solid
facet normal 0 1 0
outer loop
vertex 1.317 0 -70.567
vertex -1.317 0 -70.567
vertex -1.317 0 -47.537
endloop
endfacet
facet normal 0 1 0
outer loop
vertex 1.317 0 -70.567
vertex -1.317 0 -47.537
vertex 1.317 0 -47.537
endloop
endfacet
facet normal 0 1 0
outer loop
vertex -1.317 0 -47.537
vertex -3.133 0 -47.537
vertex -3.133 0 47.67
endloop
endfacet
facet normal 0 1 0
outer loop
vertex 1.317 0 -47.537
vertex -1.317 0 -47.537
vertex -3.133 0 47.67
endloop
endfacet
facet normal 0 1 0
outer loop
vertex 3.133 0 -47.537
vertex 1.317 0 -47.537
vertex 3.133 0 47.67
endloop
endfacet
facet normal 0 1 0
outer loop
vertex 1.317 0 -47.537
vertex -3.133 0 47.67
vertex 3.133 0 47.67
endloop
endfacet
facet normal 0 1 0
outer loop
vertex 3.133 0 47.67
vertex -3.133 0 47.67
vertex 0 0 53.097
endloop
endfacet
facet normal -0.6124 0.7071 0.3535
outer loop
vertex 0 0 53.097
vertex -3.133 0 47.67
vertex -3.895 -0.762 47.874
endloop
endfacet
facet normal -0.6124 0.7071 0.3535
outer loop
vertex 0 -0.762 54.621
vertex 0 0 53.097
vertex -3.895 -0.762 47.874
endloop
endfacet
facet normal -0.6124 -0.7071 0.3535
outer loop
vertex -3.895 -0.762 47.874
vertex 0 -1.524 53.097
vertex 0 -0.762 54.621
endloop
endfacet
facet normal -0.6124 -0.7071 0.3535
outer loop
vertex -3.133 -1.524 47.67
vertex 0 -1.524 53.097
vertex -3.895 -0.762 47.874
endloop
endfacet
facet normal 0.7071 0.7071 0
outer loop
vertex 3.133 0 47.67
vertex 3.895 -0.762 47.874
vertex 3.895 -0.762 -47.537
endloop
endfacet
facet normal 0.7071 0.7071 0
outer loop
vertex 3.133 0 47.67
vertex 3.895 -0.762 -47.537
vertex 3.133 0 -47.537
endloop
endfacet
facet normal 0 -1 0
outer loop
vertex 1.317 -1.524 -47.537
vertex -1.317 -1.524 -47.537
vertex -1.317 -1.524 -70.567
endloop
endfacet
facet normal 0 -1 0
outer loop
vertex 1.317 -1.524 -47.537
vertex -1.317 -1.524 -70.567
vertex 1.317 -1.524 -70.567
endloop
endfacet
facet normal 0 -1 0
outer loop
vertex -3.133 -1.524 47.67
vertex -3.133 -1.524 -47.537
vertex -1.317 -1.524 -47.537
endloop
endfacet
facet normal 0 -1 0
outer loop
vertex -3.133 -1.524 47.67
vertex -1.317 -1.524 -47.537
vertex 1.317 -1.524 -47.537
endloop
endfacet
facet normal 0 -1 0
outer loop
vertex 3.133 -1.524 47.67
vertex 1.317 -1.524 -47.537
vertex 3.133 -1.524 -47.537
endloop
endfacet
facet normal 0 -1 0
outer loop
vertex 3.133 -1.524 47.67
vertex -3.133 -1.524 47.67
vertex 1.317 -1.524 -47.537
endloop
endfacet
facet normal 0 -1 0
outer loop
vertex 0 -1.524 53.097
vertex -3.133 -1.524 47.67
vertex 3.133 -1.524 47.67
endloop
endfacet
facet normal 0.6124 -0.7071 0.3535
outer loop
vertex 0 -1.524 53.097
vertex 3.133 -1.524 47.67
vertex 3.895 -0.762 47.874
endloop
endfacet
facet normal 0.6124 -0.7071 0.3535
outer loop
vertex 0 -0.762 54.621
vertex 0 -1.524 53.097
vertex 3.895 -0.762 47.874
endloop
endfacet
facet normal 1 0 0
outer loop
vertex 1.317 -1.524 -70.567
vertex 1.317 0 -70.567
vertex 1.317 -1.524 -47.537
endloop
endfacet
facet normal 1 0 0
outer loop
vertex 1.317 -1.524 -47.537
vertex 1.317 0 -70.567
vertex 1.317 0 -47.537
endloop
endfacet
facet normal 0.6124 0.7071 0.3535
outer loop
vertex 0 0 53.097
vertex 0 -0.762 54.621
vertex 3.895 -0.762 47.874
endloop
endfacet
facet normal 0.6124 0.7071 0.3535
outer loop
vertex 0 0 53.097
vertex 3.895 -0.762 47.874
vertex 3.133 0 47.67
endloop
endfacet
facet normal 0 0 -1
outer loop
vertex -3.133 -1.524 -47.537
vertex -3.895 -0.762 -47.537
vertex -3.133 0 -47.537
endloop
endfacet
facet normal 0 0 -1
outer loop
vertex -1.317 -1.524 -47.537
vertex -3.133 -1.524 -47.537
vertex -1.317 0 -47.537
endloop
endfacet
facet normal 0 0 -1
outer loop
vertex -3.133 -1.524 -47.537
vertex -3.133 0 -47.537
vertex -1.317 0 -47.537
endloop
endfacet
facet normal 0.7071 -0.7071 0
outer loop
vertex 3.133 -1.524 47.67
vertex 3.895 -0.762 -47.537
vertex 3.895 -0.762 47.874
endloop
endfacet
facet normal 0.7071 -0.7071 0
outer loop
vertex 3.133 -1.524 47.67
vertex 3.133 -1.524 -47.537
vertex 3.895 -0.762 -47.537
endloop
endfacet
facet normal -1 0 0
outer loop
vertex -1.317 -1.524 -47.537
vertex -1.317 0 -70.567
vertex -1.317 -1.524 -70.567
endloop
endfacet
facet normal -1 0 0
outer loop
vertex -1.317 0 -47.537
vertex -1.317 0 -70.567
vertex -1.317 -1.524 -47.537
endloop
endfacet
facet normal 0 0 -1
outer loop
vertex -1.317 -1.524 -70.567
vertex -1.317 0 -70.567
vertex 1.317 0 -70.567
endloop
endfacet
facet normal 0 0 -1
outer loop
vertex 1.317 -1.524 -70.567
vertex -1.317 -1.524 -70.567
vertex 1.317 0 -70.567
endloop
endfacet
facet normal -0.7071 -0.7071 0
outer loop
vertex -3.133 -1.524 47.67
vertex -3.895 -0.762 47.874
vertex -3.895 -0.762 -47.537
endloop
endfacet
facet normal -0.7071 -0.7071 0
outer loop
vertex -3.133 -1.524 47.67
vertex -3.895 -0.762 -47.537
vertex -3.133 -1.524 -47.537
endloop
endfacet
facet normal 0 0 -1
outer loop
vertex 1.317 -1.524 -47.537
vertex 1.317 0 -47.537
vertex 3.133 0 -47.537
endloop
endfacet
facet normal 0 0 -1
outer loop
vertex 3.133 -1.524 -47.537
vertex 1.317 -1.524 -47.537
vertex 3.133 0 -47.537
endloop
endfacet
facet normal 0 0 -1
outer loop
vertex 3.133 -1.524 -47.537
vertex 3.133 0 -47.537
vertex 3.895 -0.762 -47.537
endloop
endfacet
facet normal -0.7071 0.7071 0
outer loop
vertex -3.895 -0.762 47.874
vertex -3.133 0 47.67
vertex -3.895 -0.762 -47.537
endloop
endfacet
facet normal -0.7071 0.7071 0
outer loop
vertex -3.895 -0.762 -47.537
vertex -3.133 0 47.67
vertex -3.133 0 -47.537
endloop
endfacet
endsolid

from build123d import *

# Parameters (mm, degrees)
F0_W        = 2.6332533453
F0_H        = 23.0305567384
F1_DEPTH    = 1.524
F2_SIZE     = 1
F3_SIZE     = 1
F4_T1_DEPTH = 13.8806275065
F5_T1_DEPTH = 12.7259269681
F6_SIZE     = 1
F7_T1_DEPTH = 98.6181021709
F8_SIZE     = 1
F9_T1_DEPTH = 98.6181021709


# Not quite as in the source:
# - a fillet or chamfer that OpenCascade refuses, or shapes differently, is made with other operations: its cross-section is extruded or revolved along the edge and cut away or added


with BuildPart() as f1:
    # F0 (on Front) → F1 (new body)
    with BuildSketch(Plane.XZ):
        Polygon((-4.1333585978, 47.5307323504), (4.1333585978, 47.5307323504), (4.3686307653, 47.5307323504), (0, 55.0974227954), (-4.3686307653, 47.5307323504), align=None)
        Polygon((4.1333585978, -47.5365004968), (4.1333585978, 47.5307323504), (-4.1333585978, 47.5307323504), (-4.1333585978, -47.5365004968), (-1.3166266726, -47.5365004968), (1.3166266726, -47.5365004968), align=None)
        with Locations((0, -59.051778866)):
            Rectangle(F0_W, F0_H)
    extrude(amount=F1_DEPTH)

    # F2
    f2_edges = [f1.edges().sort_by_distance(p)[0] for p in [
        (-2.184315, -1.524, 51.314078),
    ]]
    chamfer(f2_edges, length=F2_SIZE)

    # F3
    f3_edges = [f1.edges().sort_by_distance(p)[0] for p in [
        (2.472991, -1.524, 50.814078),
    ]]
    chamfer(f3_edges, length=F3_SIZE)

    # F4: chamfer of 1 on 1 edges, made by hand

    # F4_s2 → F4_t1 (cut)
    with BuildSketch(Plane(origin=(-18.2034116527, 0, 31.5292338535), x_dir=(0, 1, 0), z_dir=(-0.5, 0, 0.8660254038))):
        Polygon((-1, -27.5487113977), (0, -26.5487113977), (0, -27.5487113977), align=None)
    extrude(amount=F4_T1_DEPTH, mode=Mode.SUBTRACT)

    # F5: chamfer of 1 on 1 edges, made by hand

    # F5_s2 → F5_t1 (cut)
    with BuildSketch(Plane(origin=(24.5663751367, 0, 42.5502098946), x_dir=(0, 1, 0), z_dir=(-0.5, 0, -0.8660254038))):
        Polygon((0, -26.5487113977), (-1, -27.5487113977), (0, -27.5487113977), align=None)
    extrude(amount=F5_T1_DEPTH, mode=Mode.SUBTRACT)

    # F6
    f6_edges = [f1.edges().sort_by_distance(p)[0] for p in [
        (4.133359, -1.524, -0.799132),
    ]]
    chamfer(f6_edges, length=F6_SIZE)

    # F7: chamfer of 1 on 1 edges, made by hand

    # F7_s2 → F7_t1 (cut)
    with BuildSketch(Plane.XY.offset(-50.1081834848)):
        Polygon((4.1333585978, -1), (3.1333585978, 0), (4.1333585978, 0), align=None)
    extrude(amount=F7_T1_DEPTH, mode=Mode.SUBTRACT)

    # F8
    f8_edges = [f1.edges().sort_by_distance(p)[0] for p in [
        (-4.133359, 0, -0.799132),
    ]]
    chamfer(f8_edges, length=F8_SIZE)

    # F9: chamfer of 1 on 1 edges, made by hand

    # F9_s2 → F9_t1 (cut)
    with BuildSketch(Plane.XY.offset(-50.1081834848)):
        Polygon((-4.1333585978, -0.524), (-3.1333585978, -1.524), (-4.1333585978, -1.524), align=None)
    extrude(amount=F9_T1_DEPTH, mode=Mode.SUBTRACT)


solid = f1.part
